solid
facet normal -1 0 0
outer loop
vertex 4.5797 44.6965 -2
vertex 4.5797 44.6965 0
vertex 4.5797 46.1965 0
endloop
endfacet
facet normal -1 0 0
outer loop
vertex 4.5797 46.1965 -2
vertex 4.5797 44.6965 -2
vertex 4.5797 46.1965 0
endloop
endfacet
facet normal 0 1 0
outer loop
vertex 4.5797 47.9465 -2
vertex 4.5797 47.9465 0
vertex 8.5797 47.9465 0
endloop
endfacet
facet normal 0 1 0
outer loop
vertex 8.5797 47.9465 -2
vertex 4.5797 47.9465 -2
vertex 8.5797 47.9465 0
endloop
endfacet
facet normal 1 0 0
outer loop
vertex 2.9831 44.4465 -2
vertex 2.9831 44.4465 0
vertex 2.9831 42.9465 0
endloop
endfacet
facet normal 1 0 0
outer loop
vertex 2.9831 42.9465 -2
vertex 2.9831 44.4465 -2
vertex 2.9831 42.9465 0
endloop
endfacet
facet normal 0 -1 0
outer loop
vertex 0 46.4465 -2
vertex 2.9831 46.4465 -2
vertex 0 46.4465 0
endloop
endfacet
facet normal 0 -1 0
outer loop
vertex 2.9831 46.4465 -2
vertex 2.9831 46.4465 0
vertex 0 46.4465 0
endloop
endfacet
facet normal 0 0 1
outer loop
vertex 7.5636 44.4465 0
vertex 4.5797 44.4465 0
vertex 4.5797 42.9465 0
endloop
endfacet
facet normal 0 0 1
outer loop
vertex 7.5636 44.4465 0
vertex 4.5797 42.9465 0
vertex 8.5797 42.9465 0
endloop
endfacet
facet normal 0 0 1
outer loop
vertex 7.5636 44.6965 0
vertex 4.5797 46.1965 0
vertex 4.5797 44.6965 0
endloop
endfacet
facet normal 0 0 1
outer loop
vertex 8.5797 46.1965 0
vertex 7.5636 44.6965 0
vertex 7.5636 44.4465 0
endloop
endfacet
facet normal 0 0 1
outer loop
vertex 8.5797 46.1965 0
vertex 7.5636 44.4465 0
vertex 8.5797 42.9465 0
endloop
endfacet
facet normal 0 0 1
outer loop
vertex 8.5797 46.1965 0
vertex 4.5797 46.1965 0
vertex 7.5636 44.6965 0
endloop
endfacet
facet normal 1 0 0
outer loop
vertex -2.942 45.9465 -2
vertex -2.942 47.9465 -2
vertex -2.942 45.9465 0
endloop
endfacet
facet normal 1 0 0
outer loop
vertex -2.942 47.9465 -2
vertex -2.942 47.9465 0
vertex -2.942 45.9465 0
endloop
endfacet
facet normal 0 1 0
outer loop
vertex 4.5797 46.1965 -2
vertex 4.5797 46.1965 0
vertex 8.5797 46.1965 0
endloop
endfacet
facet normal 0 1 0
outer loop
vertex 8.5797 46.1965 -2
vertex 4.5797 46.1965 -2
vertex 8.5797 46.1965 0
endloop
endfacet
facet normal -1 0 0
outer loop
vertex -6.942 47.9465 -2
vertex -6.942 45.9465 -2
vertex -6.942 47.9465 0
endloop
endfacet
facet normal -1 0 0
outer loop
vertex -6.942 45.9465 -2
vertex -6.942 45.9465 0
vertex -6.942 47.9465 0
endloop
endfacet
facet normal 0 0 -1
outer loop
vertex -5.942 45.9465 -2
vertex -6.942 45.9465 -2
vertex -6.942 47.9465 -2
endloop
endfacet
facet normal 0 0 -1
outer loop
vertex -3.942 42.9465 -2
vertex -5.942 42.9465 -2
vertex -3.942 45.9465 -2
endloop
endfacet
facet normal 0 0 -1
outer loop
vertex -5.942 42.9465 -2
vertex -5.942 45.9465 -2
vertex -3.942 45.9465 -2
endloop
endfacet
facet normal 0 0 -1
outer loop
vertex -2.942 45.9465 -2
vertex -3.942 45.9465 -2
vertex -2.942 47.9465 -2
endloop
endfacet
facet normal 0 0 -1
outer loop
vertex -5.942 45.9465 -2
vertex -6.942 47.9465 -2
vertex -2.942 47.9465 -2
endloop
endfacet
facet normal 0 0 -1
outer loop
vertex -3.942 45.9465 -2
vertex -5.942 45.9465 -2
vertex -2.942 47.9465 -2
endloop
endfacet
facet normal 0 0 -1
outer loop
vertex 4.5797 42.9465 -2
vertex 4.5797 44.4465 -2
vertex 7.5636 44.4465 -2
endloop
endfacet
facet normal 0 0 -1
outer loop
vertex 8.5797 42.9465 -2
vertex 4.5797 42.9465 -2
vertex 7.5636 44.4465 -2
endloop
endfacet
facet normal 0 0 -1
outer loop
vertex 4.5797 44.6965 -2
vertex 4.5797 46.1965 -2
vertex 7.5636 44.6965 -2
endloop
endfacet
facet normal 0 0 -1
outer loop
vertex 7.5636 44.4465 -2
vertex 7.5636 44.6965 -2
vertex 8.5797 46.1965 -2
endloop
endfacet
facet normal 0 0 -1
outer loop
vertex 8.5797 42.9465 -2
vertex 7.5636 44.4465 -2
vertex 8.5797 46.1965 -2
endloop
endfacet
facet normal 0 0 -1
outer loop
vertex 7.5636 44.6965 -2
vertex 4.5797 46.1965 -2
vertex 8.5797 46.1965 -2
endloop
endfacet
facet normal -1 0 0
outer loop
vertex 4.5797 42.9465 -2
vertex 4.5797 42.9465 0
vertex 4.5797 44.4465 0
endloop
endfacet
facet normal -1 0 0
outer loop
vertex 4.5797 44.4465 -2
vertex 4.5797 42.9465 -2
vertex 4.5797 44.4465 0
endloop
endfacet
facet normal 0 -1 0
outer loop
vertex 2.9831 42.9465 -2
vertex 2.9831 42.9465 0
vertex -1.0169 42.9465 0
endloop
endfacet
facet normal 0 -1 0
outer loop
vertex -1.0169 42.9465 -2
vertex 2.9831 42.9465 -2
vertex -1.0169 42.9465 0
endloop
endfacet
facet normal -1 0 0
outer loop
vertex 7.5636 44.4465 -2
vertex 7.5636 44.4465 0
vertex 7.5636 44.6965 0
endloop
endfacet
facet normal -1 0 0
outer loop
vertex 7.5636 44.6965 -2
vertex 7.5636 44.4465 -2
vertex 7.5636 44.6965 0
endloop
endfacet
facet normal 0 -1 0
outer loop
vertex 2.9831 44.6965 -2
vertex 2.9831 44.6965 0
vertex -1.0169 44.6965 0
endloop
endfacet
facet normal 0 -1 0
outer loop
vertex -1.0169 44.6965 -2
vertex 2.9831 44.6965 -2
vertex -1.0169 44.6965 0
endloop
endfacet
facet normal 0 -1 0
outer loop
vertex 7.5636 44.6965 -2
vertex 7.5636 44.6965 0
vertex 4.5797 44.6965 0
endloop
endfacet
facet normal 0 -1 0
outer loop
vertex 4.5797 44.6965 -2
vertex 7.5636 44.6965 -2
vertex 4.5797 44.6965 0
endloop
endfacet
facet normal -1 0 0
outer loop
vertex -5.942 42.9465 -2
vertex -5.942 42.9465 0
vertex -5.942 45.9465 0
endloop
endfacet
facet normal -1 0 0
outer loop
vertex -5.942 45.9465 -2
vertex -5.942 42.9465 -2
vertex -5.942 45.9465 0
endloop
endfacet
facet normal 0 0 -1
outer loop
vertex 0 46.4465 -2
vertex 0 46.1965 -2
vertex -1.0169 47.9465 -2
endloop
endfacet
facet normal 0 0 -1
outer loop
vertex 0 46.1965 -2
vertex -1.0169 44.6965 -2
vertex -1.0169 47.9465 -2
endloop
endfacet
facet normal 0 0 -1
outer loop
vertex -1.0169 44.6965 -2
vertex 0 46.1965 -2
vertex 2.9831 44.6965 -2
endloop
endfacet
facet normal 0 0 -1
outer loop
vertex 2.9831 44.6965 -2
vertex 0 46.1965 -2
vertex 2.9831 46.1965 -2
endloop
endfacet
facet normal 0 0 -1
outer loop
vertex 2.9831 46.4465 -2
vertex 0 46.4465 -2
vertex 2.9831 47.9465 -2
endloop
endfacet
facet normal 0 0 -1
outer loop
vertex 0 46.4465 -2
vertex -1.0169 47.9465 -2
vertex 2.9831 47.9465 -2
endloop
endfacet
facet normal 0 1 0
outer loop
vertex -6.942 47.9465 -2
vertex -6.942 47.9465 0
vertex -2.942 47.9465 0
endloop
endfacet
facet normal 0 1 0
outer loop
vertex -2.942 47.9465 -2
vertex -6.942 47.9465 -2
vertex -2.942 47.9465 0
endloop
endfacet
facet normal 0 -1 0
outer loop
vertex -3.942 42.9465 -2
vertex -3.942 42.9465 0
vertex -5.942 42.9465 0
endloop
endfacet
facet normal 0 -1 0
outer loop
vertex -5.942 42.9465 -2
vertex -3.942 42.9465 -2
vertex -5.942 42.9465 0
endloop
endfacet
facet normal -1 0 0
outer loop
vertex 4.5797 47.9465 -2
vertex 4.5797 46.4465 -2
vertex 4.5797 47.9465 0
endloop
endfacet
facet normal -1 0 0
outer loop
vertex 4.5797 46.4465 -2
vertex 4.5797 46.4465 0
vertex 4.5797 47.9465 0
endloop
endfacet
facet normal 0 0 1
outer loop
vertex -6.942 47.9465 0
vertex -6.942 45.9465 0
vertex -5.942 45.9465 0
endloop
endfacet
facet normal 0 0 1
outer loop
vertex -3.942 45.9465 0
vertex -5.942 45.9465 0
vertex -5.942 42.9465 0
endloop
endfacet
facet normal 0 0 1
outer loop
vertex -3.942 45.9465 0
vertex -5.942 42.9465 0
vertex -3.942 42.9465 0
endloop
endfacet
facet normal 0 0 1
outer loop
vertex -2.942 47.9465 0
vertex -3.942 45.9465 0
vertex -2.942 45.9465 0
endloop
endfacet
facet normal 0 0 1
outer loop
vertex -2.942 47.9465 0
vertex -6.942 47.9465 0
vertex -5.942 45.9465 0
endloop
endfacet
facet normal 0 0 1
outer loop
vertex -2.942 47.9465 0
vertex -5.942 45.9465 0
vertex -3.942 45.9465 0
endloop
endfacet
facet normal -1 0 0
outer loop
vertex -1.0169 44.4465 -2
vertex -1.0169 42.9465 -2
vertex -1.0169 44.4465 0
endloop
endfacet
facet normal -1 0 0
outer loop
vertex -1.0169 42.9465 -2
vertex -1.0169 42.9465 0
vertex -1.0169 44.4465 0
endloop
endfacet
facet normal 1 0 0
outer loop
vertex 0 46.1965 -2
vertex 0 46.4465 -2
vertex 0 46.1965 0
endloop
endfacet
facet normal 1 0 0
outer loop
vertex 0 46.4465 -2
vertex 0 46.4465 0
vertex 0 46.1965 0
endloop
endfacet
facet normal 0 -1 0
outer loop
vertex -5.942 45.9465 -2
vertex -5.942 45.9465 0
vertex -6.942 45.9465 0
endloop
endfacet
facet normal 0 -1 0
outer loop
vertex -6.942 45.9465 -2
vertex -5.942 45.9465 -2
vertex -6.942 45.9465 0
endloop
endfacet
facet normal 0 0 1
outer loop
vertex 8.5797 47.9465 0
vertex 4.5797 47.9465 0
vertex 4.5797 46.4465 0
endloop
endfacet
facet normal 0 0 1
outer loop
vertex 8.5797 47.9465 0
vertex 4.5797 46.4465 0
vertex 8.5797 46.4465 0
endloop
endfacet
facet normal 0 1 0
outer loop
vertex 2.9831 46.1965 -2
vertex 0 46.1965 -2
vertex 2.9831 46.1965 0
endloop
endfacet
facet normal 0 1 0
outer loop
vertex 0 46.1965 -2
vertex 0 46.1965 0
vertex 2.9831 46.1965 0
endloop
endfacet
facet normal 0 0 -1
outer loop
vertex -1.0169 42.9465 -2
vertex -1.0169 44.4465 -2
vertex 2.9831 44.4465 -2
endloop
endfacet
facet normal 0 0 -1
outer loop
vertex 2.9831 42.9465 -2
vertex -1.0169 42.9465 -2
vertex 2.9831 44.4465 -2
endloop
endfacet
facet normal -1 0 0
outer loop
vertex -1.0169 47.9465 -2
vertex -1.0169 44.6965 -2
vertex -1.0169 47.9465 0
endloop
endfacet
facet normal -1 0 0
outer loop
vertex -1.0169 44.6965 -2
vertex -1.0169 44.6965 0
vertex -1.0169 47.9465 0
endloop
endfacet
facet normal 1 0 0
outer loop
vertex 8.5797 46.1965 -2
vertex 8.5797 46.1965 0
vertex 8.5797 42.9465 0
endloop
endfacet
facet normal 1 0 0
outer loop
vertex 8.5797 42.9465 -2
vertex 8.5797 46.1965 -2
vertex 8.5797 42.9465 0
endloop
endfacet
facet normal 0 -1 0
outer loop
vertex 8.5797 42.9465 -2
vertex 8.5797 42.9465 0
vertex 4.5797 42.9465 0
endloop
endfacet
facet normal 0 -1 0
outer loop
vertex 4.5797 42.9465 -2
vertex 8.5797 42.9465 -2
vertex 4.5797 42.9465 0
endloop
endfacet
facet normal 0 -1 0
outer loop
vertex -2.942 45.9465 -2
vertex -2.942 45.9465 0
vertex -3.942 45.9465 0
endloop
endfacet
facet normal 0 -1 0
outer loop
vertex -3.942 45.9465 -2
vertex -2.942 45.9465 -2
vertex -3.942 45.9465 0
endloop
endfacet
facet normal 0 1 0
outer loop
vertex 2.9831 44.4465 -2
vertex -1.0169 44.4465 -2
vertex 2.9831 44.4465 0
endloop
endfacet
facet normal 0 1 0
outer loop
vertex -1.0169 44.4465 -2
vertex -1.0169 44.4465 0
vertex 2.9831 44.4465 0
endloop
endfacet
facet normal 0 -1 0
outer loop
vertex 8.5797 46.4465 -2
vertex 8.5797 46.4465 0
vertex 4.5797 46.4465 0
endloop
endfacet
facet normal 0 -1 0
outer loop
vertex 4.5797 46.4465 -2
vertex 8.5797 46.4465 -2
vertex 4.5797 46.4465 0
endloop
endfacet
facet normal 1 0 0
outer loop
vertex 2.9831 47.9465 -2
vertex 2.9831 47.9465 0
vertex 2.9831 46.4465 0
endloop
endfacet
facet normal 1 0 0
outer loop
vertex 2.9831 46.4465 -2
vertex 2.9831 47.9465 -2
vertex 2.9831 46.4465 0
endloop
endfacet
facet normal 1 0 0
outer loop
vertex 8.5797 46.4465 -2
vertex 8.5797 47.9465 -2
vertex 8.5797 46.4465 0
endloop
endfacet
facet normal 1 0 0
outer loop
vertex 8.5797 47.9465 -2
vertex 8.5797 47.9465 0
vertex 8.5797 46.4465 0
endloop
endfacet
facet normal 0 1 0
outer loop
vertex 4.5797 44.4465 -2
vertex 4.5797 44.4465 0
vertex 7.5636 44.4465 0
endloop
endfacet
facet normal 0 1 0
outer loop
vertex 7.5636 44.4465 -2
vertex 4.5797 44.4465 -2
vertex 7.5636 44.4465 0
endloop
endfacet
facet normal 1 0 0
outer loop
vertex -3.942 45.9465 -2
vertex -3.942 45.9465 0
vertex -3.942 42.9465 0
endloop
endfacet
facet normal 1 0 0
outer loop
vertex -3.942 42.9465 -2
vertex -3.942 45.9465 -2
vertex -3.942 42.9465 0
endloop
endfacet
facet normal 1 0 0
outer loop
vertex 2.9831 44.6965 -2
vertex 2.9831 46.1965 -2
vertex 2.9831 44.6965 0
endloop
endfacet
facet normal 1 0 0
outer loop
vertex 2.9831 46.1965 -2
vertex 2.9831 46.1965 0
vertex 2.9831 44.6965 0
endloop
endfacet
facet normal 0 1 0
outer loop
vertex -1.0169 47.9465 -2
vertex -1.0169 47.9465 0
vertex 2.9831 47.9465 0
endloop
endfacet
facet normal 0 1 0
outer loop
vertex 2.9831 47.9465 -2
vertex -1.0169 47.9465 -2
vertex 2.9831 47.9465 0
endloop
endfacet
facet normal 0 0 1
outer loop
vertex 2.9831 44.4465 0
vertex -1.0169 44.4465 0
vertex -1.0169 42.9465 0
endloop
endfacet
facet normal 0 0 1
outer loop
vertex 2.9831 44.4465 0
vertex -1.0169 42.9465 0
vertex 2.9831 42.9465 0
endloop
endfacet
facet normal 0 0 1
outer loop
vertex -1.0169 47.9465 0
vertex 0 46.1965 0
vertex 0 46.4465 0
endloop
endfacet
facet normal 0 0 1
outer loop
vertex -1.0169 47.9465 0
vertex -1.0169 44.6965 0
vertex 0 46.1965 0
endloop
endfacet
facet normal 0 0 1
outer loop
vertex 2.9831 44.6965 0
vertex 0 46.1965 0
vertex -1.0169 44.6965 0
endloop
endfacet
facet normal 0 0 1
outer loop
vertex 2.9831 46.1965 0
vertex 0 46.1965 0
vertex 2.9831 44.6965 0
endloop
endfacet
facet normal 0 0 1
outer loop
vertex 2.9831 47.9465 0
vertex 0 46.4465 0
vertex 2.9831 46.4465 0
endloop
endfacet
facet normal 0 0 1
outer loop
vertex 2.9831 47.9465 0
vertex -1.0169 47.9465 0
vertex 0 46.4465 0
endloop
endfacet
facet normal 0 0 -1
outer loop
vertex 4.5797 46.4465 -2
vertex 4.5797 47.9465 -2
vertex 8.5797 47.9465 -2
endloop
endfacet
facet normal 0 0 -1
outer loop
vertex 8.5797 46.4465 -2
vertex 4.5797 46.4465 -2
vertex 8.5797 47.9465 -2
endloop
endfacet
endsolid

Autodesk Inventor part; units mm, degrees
ref_plane "YZ Plane" through (0, 0, 0) normal (1, 0, 0) x (0, 1, 0)
ref_plane "XZ Plane" through (0, 0, 0) normal (0, 1, 0) x (-1, 0, 0)
ref_plane "Work Plane1" through (0, 0, 0) normal (0, 0, 1) x (1, 0, 0)
sketch "Sketch1" plane through (0, 0, 0) normal (0, 0, 1) x (1, 0, 0)
  circle A0 centre (-95.35, -29.81) radius 5 projected
  circle A1 centre (-95.35, 29.81) radius 4.15 projected
  circle A2 centre (75.35, -29.81) radius 4.15 projected
  circle A3 centre (75.35, 9.93) radius 4.15 projected
  circle A4 centre (95.35, 29.81) radius 4.15 projected
  circle A5 centre (95.35, -9.93) radius 4.15 projected
  circle A6 centre (-95.35, -9.93) radius 4.15 projected
  circle A7 centre (-75.35, 9.93) radius 4.15 projected
  circle A8 centre (-75.35, 29.81) radius 4.15 projected
  circle A9 centre (-75.35, -29.81) radius 4.15 projected
  circle A10 centre (95.35, -29.81) radius 4.15 projected
  circle A11 centre (95.35, 9.93) radius 4.15 projected
  circle A12 centre (75.35, 29.81) radius 4.15 projected
  circle A13 centre (75.35, -9.93) radius 4.15 projected
  circle A14 centre (-75.35, -9.93) radius 4.15 projected
  circle A15 centre (-95.35, 9.93) radius 4.15 projected
  line L0 (-53, 34) -> (53, 34) projected
  line L1 (53, 34) -> (53, -34) projected
  line L2 (53, -34) -> (-53, -34) projected
  line L3 (-53, -34) -> (-53, 34) projected
  line L4 (0, 46.4465) -> (0, 46.1965) projected
  line L5 (0, 46.1965) -> (2.9831, 46.1965) projected
  line L6 (2.9831, 46.1965) -> (2.9831, 44.6965) projected
  line L7 (2.9831, 44.6965) -> (-1.0169, 44.6965) projected
  line L8 (-1.0169, 44.6965) -> (-1.0169, 47.9465) projected
  line L9 (-1.0169, 47.9465) -> (2.9831, 47.9465) projected
  line L10 (2.9831, 47.9465) -> (2.9831, 46.4465) projected
  line L11 (2.9831, 46.4465) -> (0, 46.4465) projected
  line L12 (4.5797, 46.4465) -> (4.5797, 47.9465) projected
  line L13 (4.5797, 47.9465) -> (8.5797, 47.9465) projected
  line L14 (8.5797, 47.9465) -> (8.5797, 46.4465) projected
  line L15 (8.5797, 46.4465) -> (4.5797, 46.4465) projected
  line L16 (2.9831, 44.4465) -> (2.9831, 42.9465) projected
  line L17 (2.9831, 42.9465) -> (-1.0169, 42.9465) projected
  line L18 (-1.0169, 42.9465) -> (-1.0169, 44.4465) projected
  line L19 (-1.0169, 44.4465) -> (2.9831, 44.4465) projected
  line L20 (7.5636, 44.4465) -> (7.5636, 44.6965) projected
  line L21 (7.5636, 44.6965) -> (4.5797, 44.6965) projected
  line L22 (4.5797, 44.6965) -> (4.5797, 46.1965) projected
  line L23 (4.5797, 46.1965) -> (8.5797, 46.1965) projected
  line L24 (8.5797, 46.1965) -> (8.5797, 42.9465) projected
  line L25 (8.5797, 42.9465) -> (4.5797, 42.9465) projected
  line L26 (4.5797, 42.9465) -> (4.5797, 44.4465) projected
  line L27 (4.5797, 44.4465) -> (7.5636, 44.4465) projected
  line L28 (-2.942, 47.9465) -> (-2.942, 45.9465) projected
  line L29 (-2.942, 45.9465) -> (-3.942, 45.9465) projected
  line L30 (-3.942, 45.9465) -> (-3.942, 42.9465) projected
  line L31 (-3.942, 42.9465) -> (-5.942, 42.9465) projected
  line L32 (-5.942, 42.9465) -> (-5.942, 45.9465) projected
  line L33 (-5.942, 45.9465) -> (-6.942, 45.9465) projected
  line L34 (-6.942, 45.9465) -> (-6.942, 47.9465) projected
  line L35 (-6.942, 47.9465) -> (-2.942, 47.9465) projected
  arc A16 (-69.3301, 52.5) -> (-73.6603, 55) centre (-73.6603, 50) ccw projected
  line L36 (-73.6603, 55) -> (-110, 55) projected
  arc A17 (-110, 55) -> (-115, 50) centre (-110, 50) ccw projected
  line L37 (-115, 50) -> (-115, -50) projected
  arc A18 (-115, -50) -> (-110, -55) centre (-110, -50) ccw projected
  line L38 (-110, -55) -> (-73.6603, -55) projected
  arc A19 (-73.6603, -55) -> (-69.3301, -52.5) centre (-73.6603, -50) ccw projected
  arc A20 (-65, -50) -> (-69.3301, -52.5) centre (-65, -55) ccw projected
  line L39 (-65, -50) -> (65, -50) projected
  arc A21 (69.3301, -52.5) -> (65, -50) centre (65, -55) ccw projected
  arc A22 (69.3301, -52.5) -> (73.6603, -55) centre (73.6603, -50) ccw projected
  line L40 (73.6603, -55) -> (110, -55) projected
  arc A23 (110, -55) -> (115, -50) centre (110, -50) ccw projected
  line L41 (115, -50) -> (115, 50) projected
  arc A24 (115, 50) -> (110, 55) centre (110, 50) ccw projected
  line L42 (110, 55) -> (73.6603, 55) projected
  arc A25 (73.6603, 55) -> (69.3301, 52.5) centre (73.6603, 50) ccw projected
  arc A26 (65, 50) -> (69.3301, 52.5) centre (65, 55) ccw projected
  line L43 (65, 50) -> (-65, 50) projected
  arc A27 (-69.3301, 52.5) -> (-65, 50) centre (-65, 55) ccw projected
  point P0 (0, 0)
extrude "Extrusion1" add sketch "Sketch1" against normal blind 2 contours L4 L5 L6 L7 L8 L9 L10 L11 | L12 L13 L14 L15 | L16 L17 L18 L19 | L20 L21 L22 L23 L24 L25 L26 L27 | L28 L29 L30 L31 L32 L33 L34 L35
properties part number "tss logo" material "ABS Plastic"
